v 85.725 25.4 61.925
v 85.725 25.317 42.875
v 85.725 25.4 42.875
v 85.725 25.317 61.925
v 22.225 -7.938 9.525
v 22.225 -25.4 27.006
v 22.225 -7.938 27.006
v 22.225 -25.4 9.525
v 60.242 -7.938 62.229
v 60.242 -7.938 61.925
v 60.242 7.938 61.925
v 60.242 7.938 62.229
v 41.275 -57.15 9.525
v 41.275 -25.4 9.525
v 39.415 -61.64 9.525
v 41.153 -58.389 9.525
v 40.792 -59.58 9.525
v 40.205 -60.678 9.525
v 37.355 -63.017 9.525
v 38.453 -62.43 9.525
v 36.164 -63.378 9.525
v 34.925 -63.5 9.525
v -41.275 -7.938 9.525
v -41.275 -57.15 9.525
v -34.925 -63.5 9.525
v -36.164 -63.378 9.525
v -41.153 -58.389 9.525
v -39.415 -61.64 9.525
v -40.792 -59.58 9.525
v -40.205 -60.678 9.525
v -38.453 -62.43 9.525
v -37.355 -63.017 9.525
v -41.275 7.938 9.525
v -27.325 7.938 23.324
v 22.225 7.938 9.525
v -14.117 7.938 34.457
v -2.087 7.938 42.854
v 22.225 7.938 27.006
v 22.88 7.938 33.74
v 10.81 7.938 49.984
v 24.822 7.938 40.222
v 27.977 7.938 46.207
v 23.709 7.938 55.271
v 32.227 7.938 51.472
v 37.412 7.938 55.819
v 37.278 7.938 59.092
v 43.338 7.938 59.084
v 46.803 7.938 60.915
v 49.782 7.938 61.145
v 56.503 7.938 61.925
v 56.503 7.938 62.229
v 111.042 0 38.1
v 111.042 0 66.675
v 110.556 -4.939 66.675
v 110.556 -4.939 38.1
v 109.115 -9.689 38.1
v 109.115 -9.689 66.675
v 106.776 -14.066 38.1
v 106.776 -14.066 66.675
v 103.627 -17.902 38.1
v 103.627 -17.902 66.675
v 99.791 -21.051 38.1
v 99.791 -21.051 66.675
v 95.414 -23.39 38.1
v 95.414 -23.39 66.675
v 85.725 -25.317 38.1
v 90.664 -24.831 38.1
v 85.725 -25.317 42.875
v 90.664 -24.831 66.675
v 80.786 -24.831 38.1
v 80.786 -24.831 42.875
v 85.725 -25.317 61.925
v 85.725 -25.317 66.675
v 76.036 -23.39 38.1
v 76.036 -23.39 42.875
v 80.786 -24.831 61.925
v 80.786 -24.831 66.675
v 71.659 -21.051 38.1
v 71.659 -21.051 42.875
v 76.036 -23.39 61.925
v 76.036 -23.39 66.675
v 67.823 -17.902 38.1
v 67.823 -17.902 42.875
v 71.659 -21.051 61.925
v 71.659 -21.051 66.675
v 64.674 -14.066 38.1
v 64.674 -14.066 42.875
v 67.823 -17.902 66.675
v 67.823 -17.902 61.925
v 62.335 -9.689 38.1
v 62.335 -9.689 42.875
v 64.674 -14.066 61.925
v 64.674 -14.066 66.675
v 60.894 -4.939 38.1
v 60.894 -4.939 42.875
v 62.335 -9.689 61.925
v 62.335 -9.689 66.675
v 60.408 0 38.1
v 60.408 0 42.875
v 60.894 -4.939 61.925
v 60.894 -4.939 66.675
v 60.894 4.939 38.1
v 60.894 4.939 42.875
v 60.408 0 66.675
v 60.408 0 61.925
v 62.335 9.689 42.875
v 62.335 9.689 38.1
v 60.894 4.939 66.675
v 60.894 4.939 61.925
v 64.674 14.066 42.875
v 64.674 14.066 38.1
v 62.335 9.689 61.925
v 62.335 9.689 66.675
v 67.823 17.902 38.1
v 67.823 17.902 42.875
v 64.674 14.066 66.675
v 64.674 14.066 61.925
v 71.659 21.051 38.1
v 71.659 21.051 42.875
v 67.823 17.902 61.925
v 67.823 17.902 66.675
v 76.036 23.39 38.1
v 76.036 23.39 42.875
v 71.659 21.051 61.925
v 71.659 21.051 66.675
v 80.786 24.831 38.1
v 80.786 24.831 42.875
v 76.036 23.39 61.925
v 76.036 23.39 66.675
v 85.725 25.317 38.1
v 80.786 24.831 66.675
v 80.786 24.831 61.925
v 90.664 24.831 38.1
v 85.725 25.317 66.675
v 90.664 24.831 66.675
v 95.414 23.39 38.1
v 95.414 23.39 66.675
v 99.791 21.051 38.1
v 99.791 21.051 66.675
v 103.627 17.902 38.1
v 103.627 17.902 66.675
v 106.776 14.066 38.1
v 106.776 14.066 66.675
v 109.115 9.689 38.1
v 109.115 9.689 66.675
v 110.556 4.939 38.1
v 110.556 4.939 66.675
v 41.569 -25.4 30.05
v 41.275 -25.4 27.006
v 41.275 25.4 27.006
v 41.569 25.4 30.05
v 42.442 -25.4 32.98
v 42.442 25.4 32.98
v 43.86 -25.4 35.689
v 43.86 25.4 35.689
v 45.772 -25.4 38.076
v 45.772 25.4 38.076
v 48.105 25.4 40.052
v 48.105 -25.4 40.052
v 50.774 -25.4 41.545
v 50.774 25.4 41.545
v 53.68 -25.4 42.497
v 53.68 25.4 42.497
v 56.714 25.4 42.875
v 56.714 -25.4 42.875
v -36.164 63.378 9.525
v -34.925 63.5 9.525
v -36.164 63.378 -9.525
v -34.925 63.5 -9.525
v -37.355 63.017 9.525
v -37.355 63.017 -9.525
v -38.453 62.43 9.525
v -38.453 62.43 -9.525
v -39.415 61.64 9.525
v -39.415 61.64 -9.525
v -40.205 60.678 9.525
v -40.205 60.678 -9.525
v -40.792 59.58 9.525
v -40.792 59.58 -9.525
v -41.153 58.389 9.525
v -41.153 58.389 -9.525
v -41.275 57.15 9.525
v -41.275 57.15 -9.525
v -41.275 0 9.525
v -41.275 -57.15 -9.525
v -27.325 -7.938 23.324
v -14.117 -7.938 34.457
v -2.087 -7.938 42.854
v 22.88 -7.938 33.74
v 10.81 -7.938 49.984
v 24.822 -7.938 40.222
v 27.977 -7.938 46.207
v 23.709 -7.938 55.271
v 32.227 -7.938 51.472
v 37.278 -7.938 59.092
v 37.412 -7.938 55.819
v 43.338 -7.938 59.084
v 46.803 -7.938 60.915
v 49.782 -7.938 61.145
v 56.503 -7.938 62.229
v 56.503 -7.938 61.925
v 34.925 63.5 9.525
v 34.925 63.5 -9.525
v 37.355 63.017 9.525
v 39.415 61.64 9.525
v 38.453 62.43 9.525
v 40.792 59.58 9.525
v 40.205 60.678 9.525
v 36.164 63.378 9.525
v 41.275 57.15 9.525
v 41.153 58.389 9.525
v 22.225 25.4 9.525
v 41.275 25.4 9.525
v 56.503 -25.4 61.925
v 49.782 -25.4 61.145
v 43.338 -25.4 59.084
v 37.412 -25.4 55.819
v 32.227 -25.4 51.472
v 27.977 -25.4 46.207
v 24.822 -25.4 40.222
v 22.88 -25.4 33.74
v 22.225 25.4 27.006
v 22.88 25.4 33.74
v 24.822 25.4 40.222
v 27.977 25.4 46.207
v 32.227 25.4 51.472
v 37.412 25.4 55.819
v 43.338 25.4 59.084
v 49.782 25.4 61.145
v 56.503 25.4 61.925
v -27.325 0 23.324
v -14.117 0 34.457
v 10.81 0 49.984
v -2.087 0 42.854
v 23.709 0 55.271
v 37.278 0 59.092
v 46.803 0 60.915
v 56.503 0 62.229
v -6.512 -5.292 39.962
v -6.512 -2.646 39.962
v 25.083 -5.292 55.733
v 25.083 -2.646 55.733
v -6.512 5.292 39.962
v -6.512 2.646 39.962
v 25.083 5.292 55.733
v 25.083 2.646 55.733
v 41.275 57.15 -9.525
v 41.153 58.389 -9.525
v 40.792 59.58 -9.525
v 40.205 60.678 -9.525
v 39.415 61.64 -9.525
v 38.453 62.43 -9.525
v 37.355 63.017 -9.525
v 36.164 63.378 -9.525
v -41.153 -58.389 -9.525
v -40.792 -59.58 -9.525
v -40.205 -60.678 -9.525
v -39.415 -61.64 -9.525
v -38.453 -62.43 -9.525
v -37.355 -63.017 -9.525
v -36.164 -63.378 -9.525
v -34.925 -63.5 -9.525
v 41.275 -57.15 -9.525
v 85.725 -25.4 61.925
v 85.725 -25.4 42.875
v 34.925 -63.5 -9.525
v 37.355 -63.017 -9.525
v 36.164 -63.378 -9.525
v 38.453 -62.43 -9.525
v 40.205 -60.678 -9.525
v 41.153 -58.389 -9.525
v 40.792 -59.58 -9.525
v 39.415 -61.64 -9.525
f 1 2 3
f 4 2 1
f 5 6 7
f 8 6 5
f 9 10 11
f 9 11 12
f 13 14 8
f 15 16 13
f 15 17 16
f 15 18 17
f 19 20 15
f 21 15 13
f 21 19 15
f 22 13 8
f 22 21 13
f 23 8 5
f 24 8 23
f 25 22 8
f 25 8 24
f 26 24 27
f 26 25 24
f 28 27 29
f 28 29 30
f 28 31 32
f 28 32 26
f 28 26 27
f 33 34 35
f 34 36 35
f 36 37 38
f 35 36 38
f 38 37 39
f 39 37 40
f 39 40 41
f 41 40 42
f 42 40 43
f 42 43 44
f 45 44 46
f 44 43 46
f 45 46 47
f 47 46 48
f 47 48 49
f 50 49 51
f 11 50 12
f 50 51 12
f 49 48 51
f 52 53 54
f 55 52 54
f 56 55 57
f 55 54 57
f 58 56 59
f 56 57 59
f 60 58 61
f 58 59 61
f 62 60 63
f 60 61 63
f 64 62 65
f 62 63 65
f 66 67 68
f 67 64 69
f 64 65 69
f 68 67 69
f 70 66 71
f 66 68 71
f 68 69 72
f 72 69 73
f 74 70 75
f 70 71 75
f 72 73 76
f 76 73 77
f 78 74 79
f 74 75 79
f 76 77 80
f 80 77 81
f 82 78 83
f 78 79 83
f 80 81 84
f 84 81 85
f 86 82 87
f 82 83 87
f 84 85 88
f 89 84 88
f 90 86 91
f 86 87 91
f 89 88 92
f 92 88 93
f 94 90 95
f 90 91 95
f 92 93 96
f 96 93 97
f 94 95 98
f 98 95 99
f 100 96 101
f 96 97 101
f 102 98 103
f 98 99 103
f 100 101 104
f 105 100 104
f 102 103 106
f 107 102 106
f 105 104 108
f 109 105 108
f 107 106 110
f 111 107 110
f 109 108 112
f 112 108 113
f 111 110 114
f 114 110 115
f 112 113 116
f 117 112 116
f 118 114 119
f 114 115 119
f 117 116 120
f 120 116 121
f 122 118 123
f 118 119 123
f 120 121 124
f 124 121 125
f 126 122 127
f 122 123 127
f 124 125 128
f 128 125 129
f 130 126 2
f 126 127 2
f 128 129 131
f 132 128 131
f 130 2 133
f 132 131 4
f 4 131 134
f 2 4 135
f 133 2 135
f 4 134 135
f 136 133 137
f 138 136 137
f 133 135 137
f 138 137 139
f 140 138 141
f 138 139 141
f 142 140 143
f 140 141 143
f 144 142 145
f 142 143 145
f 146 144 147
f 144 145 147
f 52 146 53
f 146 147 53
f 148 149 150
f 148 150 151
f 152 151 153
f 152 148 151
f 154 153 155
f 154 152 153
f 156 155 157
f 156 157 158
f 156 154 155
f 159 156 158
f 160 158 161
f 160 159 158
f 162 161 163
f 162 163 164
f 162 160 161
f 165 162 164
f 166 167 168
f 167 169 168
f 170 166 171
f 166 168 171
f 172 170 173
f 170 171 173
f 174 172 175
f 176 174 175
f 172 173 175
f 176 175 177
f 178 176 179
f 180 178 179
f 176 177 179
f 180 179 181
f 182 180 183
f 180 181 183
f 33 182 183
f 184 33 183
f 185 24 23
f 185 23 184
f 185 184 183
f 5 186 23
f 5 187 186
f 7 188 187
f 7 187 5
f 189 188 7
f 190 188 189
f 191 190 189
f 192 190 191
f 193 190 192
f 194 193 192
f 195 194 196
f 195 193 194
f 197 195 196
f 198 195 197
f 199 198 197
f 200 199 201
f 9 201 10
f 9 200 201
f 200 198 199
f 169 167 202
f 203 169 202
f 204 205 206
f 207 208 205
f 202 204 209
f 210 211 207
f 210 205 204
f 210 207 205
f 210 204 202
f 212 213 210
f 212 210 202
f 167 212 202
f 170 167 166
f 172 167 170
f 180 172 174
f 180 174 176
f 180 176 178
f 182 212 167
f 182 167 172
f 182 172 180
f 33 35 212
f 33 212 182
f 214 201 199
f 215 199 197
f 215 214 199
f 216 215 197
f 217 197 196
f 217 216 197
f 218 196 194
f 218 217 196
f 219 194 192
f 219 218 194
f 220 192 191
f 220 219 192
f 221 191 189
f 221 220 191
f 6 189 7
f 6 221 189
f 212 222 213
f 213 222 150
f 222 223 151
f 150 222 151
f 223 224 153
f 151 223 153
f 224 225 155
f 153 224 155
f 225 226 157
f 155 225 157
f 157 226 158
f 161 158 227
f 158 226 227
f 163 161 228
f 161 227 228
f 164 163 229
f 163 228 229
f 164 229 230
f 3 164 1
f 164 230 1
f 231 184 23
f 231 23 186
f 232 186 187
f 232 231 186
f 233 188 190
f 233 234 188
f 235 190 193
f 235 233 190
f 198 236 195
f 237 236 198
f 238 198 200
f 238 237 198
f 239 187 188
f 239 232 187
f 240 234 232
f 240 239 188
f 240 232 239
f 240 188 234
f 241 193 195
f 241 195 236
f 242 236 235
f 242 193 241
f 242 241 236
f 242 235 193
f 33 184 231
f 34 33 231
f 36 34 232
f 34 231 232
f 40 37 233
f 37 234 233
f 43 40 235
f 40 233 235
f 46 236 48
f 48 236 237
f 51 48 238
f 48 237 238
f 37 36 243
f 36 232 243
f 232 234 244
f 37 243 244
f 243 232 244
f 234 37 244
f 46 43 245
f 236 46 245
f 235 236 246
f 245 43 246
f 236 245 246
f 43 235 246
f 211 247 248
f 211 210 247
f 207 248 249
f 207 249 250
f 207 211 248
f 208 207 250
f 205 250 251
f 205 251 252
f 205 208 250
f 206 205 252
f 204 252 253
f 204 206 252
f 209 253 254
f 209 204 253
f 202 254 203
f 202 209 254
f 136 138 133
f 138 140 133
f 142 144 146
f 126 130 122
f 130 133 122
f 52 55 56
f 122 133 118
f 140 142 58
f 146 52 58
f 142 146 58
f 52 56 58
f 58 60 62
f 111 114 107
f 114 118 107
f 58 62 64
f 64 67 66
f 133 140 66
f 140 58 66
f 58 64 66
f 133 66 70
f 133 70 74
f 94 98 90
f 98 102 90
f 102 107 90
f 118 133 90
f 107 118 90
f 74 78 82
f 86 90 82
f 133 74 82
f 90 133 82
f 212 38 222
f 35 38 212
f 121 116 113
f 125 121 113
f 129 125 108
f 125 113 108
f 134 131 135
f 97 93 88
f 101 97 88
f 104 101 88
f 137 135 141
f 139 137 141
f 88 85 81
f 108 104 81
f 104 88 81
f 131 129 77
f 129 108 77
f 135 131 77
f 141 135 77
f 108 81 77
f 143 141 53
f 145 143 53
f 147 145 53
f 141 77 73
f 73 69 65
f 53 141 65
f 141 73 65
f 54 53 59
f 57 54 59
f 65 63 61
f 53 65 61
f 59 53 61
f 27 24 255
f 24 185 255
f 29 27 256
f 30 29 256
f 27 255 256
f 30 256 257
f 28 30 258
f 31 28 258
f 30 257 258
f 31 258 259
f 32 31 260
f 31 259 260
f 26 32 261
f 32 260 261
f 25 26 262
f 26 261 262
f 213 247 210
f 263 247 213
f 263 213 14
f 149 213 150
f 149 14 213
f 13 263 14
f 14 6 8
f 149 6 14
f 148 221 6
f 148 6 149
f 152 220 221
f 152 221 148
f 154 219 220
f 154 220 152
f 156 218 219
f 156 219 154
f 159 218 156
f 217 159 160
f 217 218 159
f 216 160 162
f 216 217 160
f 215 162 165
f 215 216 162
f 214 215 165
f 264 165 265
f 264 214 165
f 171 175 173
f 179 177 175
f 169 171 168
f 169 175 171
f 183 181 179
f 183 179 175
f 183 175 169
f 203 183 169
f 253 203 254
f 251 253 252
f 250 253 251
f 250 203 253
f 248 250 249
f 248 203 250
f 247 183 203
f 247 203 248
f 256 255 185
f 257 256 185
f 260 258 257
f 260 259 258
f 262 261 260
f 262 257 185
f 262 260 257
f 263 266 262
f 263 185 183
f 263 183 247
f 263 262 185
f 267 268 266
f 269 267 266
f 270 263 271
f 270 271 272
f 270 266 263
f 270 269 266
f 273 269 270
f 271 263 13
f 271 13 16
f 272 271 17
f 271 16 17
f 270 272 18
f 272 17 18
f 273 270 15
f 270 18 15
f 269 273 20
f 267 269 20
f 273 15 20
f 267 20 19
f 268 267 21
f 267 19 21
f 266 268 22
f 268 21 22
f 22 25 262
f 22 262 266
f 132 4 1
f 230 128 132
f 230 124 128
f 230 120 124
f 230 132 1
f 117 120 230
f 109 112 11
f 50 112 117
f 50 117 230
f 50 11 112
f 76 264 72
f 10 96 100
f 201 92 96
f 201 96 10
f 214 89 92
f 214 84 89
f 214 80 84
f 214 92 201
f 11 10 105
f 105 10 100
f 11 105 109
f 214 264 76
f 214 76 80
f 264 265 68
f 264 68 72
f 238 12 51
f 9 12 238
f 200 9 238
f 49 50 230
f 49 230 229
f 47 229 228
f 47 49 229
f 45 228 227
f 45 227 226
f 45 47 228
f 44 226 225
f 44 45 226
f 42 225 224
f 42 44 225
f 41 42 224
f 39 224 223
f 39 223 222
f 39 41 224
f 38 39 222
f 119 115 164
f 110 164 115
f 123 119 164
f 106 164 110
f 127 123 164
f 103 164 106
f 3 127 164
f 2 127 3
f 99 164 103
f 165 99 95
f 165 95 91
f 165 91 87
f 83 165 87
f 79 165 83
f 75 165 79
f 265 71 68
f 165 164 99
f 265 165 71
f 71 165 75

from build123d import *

# Parameters (mm, degrees)
F1_DEPTH = 63.5
F0_W     = 25.4827047348
F0_H     = 19.05
F2_DEPTH = 25.4
F3_DEPTH = 7.9375
F5_R     = 6.35
F6_R     = 6.35


with BuildPart() as f1:
    # F0 (on Front) → F1 (new body, symmetric)
    with BuildSketch(Plane.XZ):
        Polygon((41.275, -9.525), (41.275, 9.525), (22.225, 9.525), (-41.275, 9.525), (-41.275, -9.525), align=None)
    extrude(amount=F1_DEPTH, both=True)

    # F0 (on Front) → F2 (join, symmetric)
    with BuildSketch(Plane.XZ):
        with BuildLine():
            Line((22.225, 9.525), (41.275, 9.525))
            Line((41.275, 9.525), (41.275, 27.0061871217))
            ThreePointArc((41.275, 27.0061871217), (45.7715909854, 38.0763015427), (56.7140467144, 42.8752))
            Line((56.7140467144, 42.8752), (60.2422952652, 42.8752))
            Line((60.2422952652, 42.8752), (60.2422952652, 61.9252))
            Line((60.2422952652, 61.9252), (56.5033435204, 61.9252))
            ThreePointArc((56.5033435204, 61.9252), (32.2267166835, 51.4721956585), (22.225, 27.0061871217))
            Line((22.225, 27.0061871217), (22.225, 9.525))
        make_face()
        with Locations((72.9836476326, 52.4002)):
            Rectangle(F0_W, F0_H)
    extrude(amount=F2_DEPTH, both=True)

    # F0 (on Front) → F3 (join, symmetric)
    with BuildSketch(Plane.XZ):
        with BuildLine():
            Line((-41.275, 9.525), (22.225, 9.525))
            Line((22.225, 9.525), (22.225, 27.0061871217))
            ThreePointArc((22.225, 27.0061871217), (32.2267166835, 51.4721956585), (56.5033435204, 61.9252))
            Line((56.5033435204, 61.9252), (60.2422952652, 61.9252))
            Line((60.2422952652, 61.9252), (60.2422952652, 62.2294992208))
            Line((60.2422952652, 62.2294992208), (56.5033435204, 62.2294992208))
            add(Edge.make_bspline(
                [(-41.275, 9.525), (-3.9314110763, 49.0912124515), (24.1732224822, 58.5743710399), (56.5033435204, 62.2294992208)],
                knots=[0, 0, 0, 0, 111.0782098331, 111.0782098331, 111.0782098331, 111.0782098331], degree=3))
        make_face()
    extrude(amount=F3_DEPTH, both=True)

    # F0 (on Front) → F4 (revolve)
    with BuildSketch(Plane.XZ):
        Polygon((85.725, 61.9252), (85.725, 42.8752), (85.725, 38.1), (111.0422952652, 38.1), (111.0422952652, 66.675), (85.725, 66.675), (85.725, 62.2294992208), align=None)
    revolve(axis=Axis((85.725, 0, 52.5523496104), (0, 0, -1)))

    # F5
    f5_edges = [f1.edges().sort_by_distance(p)[0] for p in [
        (41.275, -63.5, 0),
        (41.275, 63.5, 0),
    ]]
    fillet(f5_edges, radius=F5_R)

    # F6
    f6_edges = [f1.edges().sort_by_distance(p)[0] for p in [
        (-41.275, -63.5, 0),
        (-41.275, 63.5, 0),
    ]]
    fillet(f6_edges, radius=F6_R)


solid = f1.part
